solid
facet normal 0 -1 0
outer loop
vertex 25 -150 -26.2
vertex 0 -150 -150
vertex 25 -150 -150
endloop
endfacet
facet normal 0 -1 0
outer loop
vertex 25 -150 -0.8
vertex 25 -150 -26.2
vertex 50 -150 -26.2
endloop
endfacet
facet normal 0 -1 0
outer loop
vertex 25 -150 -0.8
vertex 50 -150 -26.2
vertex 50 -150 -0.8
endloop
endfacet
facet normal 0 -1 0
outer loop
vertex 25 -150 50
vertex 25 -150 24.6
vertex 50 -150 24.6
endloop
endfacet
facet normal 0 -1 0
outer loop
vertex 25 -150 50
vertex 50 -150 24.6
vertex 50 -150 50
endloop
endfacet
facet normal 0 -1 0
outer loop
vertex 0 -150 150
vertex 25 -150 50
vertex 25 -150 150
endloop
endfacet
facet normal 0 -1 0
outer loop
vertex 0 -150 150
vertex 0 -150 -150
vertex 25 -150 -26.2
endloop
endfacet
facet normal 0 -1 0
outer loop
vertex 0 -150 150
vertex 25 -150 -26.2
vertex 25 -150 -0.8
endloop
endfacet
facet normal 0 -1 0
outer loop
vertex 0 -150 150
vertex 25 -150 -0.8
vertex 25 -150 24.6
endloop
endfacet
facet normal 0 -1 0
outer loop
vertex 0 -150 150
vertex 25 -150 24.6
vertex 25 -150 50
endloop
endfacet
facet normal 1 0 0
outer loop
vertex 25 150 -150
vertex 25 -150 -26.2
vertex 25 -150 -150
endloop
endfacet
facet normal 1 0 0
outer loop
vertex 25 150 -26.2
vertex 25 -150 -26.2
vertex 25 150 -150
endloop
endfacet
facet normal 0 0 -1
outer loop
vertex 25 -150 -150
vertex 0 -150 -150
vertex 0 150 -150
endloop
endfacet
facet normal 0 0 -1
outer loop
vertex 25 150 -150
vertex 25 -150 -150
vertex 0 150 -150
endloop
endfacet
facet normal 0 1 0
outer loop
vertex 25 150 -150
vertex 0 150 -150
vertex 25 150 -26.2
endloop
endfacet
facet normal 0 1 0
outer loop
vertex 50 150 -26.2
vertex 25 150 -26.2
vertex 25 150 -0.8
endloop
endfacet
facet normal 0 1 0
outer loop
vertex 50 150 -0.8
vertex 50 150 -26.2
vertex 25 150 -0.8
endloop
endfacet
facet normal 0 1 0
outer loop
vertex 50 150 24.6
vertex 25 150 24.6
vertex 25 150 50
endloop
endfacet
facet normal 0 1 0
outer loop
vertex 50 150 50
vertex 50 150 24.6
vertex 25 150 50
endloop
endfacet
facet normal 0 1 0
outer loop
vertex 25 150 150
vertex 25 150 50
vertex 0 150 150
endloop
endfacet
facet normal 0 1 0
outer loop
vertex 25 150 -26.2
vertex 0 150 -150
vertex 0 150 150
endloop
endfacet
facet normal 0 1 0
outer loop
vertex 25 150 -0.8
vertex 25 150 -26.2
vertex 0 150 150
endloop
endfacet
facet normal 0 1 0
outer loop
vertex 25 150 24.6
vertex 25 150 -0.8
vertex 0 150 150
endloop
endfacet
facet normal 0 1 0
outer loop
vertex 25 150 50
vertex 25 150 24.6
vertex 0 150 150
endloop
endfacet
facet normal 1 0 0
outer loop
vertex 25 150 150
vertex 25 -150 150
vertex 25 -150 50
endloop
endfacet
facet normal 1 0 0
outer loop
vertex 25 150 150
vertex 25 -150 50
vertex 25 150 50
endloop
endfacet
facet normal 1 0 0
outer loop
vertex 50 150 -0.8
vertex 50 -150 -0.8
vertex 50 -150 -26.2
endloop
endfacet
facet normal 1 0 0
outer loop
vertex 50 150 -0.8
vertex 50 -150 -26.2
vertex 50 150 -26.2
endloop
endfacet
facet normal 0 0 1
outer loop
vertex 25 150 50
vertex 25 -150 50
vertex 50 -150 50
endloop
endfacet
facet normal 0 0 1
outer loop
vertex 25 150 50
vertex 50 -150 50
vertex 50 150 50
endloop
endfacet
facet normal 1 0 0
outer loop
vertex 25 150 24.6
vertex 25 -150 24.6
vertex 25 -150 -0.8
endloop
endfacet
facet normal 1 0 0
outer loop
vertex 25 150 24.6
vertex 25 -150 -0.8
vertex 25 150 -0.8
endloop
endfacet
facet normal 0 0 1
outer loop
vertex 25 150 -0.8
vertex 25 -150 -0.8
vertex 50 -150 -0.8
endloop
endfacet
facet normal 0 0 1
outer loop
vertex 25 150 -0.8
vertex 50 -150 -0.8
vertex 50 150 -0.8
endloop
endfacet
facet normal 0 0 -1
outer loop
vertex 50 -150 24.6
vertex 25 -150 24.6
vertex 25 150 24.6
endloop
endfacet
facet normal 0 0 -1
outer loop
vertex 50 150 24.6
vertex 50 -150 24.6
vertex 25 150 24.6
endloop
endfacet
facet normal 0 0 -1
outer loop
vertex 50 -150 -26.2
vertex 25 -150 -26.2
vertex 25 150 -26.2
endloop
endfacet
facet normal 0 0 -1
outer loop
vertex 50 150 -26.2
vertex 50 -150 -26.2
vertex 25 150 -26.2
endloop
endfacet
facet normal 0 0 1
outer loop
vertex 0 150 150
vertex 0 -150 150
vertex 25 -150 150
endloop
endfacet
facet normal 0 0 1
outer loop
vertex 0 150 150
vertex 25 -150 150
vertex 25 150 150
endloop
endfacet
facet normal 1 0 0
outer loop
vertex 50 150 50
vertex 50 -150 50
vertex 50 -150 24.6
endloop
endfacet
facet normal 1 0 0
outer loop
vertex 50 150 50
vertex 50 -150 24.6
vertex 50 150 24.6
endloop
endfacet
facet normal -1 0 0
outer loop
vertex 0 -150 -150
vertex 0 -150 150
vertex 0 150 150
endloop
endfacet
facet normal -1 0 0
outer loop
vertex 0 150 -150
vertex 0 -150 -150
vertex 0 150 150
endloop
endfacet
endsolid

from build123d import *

# Parameters (mm, degrees)
F0_W     = 300
F0_H     = 300
F1_DEPTH = 25
F2_W     = 300
F2_H     = 25.4
F3_DEPTH = 25


with BuildPart() as f1:
    # F0 (on Right) → F1 (new body)
    with BuildSketch(Plane.YZ):
        Rectangle(F0_W, F0_H)
    extrude(amount=F1_DEPTH)

    # F2 (on face) → F3 (join)
    with BuildSketch(Plane.YZ.offset(25)):
        with Locations((0, -13.5)):
            Rectangle(F2_W, F2_H)
        with Locations((0, 37.3)):
            Rectangle(F2_W, F2_H)
    extrude(amount=F3_DEPTH)


solid = f1.part
